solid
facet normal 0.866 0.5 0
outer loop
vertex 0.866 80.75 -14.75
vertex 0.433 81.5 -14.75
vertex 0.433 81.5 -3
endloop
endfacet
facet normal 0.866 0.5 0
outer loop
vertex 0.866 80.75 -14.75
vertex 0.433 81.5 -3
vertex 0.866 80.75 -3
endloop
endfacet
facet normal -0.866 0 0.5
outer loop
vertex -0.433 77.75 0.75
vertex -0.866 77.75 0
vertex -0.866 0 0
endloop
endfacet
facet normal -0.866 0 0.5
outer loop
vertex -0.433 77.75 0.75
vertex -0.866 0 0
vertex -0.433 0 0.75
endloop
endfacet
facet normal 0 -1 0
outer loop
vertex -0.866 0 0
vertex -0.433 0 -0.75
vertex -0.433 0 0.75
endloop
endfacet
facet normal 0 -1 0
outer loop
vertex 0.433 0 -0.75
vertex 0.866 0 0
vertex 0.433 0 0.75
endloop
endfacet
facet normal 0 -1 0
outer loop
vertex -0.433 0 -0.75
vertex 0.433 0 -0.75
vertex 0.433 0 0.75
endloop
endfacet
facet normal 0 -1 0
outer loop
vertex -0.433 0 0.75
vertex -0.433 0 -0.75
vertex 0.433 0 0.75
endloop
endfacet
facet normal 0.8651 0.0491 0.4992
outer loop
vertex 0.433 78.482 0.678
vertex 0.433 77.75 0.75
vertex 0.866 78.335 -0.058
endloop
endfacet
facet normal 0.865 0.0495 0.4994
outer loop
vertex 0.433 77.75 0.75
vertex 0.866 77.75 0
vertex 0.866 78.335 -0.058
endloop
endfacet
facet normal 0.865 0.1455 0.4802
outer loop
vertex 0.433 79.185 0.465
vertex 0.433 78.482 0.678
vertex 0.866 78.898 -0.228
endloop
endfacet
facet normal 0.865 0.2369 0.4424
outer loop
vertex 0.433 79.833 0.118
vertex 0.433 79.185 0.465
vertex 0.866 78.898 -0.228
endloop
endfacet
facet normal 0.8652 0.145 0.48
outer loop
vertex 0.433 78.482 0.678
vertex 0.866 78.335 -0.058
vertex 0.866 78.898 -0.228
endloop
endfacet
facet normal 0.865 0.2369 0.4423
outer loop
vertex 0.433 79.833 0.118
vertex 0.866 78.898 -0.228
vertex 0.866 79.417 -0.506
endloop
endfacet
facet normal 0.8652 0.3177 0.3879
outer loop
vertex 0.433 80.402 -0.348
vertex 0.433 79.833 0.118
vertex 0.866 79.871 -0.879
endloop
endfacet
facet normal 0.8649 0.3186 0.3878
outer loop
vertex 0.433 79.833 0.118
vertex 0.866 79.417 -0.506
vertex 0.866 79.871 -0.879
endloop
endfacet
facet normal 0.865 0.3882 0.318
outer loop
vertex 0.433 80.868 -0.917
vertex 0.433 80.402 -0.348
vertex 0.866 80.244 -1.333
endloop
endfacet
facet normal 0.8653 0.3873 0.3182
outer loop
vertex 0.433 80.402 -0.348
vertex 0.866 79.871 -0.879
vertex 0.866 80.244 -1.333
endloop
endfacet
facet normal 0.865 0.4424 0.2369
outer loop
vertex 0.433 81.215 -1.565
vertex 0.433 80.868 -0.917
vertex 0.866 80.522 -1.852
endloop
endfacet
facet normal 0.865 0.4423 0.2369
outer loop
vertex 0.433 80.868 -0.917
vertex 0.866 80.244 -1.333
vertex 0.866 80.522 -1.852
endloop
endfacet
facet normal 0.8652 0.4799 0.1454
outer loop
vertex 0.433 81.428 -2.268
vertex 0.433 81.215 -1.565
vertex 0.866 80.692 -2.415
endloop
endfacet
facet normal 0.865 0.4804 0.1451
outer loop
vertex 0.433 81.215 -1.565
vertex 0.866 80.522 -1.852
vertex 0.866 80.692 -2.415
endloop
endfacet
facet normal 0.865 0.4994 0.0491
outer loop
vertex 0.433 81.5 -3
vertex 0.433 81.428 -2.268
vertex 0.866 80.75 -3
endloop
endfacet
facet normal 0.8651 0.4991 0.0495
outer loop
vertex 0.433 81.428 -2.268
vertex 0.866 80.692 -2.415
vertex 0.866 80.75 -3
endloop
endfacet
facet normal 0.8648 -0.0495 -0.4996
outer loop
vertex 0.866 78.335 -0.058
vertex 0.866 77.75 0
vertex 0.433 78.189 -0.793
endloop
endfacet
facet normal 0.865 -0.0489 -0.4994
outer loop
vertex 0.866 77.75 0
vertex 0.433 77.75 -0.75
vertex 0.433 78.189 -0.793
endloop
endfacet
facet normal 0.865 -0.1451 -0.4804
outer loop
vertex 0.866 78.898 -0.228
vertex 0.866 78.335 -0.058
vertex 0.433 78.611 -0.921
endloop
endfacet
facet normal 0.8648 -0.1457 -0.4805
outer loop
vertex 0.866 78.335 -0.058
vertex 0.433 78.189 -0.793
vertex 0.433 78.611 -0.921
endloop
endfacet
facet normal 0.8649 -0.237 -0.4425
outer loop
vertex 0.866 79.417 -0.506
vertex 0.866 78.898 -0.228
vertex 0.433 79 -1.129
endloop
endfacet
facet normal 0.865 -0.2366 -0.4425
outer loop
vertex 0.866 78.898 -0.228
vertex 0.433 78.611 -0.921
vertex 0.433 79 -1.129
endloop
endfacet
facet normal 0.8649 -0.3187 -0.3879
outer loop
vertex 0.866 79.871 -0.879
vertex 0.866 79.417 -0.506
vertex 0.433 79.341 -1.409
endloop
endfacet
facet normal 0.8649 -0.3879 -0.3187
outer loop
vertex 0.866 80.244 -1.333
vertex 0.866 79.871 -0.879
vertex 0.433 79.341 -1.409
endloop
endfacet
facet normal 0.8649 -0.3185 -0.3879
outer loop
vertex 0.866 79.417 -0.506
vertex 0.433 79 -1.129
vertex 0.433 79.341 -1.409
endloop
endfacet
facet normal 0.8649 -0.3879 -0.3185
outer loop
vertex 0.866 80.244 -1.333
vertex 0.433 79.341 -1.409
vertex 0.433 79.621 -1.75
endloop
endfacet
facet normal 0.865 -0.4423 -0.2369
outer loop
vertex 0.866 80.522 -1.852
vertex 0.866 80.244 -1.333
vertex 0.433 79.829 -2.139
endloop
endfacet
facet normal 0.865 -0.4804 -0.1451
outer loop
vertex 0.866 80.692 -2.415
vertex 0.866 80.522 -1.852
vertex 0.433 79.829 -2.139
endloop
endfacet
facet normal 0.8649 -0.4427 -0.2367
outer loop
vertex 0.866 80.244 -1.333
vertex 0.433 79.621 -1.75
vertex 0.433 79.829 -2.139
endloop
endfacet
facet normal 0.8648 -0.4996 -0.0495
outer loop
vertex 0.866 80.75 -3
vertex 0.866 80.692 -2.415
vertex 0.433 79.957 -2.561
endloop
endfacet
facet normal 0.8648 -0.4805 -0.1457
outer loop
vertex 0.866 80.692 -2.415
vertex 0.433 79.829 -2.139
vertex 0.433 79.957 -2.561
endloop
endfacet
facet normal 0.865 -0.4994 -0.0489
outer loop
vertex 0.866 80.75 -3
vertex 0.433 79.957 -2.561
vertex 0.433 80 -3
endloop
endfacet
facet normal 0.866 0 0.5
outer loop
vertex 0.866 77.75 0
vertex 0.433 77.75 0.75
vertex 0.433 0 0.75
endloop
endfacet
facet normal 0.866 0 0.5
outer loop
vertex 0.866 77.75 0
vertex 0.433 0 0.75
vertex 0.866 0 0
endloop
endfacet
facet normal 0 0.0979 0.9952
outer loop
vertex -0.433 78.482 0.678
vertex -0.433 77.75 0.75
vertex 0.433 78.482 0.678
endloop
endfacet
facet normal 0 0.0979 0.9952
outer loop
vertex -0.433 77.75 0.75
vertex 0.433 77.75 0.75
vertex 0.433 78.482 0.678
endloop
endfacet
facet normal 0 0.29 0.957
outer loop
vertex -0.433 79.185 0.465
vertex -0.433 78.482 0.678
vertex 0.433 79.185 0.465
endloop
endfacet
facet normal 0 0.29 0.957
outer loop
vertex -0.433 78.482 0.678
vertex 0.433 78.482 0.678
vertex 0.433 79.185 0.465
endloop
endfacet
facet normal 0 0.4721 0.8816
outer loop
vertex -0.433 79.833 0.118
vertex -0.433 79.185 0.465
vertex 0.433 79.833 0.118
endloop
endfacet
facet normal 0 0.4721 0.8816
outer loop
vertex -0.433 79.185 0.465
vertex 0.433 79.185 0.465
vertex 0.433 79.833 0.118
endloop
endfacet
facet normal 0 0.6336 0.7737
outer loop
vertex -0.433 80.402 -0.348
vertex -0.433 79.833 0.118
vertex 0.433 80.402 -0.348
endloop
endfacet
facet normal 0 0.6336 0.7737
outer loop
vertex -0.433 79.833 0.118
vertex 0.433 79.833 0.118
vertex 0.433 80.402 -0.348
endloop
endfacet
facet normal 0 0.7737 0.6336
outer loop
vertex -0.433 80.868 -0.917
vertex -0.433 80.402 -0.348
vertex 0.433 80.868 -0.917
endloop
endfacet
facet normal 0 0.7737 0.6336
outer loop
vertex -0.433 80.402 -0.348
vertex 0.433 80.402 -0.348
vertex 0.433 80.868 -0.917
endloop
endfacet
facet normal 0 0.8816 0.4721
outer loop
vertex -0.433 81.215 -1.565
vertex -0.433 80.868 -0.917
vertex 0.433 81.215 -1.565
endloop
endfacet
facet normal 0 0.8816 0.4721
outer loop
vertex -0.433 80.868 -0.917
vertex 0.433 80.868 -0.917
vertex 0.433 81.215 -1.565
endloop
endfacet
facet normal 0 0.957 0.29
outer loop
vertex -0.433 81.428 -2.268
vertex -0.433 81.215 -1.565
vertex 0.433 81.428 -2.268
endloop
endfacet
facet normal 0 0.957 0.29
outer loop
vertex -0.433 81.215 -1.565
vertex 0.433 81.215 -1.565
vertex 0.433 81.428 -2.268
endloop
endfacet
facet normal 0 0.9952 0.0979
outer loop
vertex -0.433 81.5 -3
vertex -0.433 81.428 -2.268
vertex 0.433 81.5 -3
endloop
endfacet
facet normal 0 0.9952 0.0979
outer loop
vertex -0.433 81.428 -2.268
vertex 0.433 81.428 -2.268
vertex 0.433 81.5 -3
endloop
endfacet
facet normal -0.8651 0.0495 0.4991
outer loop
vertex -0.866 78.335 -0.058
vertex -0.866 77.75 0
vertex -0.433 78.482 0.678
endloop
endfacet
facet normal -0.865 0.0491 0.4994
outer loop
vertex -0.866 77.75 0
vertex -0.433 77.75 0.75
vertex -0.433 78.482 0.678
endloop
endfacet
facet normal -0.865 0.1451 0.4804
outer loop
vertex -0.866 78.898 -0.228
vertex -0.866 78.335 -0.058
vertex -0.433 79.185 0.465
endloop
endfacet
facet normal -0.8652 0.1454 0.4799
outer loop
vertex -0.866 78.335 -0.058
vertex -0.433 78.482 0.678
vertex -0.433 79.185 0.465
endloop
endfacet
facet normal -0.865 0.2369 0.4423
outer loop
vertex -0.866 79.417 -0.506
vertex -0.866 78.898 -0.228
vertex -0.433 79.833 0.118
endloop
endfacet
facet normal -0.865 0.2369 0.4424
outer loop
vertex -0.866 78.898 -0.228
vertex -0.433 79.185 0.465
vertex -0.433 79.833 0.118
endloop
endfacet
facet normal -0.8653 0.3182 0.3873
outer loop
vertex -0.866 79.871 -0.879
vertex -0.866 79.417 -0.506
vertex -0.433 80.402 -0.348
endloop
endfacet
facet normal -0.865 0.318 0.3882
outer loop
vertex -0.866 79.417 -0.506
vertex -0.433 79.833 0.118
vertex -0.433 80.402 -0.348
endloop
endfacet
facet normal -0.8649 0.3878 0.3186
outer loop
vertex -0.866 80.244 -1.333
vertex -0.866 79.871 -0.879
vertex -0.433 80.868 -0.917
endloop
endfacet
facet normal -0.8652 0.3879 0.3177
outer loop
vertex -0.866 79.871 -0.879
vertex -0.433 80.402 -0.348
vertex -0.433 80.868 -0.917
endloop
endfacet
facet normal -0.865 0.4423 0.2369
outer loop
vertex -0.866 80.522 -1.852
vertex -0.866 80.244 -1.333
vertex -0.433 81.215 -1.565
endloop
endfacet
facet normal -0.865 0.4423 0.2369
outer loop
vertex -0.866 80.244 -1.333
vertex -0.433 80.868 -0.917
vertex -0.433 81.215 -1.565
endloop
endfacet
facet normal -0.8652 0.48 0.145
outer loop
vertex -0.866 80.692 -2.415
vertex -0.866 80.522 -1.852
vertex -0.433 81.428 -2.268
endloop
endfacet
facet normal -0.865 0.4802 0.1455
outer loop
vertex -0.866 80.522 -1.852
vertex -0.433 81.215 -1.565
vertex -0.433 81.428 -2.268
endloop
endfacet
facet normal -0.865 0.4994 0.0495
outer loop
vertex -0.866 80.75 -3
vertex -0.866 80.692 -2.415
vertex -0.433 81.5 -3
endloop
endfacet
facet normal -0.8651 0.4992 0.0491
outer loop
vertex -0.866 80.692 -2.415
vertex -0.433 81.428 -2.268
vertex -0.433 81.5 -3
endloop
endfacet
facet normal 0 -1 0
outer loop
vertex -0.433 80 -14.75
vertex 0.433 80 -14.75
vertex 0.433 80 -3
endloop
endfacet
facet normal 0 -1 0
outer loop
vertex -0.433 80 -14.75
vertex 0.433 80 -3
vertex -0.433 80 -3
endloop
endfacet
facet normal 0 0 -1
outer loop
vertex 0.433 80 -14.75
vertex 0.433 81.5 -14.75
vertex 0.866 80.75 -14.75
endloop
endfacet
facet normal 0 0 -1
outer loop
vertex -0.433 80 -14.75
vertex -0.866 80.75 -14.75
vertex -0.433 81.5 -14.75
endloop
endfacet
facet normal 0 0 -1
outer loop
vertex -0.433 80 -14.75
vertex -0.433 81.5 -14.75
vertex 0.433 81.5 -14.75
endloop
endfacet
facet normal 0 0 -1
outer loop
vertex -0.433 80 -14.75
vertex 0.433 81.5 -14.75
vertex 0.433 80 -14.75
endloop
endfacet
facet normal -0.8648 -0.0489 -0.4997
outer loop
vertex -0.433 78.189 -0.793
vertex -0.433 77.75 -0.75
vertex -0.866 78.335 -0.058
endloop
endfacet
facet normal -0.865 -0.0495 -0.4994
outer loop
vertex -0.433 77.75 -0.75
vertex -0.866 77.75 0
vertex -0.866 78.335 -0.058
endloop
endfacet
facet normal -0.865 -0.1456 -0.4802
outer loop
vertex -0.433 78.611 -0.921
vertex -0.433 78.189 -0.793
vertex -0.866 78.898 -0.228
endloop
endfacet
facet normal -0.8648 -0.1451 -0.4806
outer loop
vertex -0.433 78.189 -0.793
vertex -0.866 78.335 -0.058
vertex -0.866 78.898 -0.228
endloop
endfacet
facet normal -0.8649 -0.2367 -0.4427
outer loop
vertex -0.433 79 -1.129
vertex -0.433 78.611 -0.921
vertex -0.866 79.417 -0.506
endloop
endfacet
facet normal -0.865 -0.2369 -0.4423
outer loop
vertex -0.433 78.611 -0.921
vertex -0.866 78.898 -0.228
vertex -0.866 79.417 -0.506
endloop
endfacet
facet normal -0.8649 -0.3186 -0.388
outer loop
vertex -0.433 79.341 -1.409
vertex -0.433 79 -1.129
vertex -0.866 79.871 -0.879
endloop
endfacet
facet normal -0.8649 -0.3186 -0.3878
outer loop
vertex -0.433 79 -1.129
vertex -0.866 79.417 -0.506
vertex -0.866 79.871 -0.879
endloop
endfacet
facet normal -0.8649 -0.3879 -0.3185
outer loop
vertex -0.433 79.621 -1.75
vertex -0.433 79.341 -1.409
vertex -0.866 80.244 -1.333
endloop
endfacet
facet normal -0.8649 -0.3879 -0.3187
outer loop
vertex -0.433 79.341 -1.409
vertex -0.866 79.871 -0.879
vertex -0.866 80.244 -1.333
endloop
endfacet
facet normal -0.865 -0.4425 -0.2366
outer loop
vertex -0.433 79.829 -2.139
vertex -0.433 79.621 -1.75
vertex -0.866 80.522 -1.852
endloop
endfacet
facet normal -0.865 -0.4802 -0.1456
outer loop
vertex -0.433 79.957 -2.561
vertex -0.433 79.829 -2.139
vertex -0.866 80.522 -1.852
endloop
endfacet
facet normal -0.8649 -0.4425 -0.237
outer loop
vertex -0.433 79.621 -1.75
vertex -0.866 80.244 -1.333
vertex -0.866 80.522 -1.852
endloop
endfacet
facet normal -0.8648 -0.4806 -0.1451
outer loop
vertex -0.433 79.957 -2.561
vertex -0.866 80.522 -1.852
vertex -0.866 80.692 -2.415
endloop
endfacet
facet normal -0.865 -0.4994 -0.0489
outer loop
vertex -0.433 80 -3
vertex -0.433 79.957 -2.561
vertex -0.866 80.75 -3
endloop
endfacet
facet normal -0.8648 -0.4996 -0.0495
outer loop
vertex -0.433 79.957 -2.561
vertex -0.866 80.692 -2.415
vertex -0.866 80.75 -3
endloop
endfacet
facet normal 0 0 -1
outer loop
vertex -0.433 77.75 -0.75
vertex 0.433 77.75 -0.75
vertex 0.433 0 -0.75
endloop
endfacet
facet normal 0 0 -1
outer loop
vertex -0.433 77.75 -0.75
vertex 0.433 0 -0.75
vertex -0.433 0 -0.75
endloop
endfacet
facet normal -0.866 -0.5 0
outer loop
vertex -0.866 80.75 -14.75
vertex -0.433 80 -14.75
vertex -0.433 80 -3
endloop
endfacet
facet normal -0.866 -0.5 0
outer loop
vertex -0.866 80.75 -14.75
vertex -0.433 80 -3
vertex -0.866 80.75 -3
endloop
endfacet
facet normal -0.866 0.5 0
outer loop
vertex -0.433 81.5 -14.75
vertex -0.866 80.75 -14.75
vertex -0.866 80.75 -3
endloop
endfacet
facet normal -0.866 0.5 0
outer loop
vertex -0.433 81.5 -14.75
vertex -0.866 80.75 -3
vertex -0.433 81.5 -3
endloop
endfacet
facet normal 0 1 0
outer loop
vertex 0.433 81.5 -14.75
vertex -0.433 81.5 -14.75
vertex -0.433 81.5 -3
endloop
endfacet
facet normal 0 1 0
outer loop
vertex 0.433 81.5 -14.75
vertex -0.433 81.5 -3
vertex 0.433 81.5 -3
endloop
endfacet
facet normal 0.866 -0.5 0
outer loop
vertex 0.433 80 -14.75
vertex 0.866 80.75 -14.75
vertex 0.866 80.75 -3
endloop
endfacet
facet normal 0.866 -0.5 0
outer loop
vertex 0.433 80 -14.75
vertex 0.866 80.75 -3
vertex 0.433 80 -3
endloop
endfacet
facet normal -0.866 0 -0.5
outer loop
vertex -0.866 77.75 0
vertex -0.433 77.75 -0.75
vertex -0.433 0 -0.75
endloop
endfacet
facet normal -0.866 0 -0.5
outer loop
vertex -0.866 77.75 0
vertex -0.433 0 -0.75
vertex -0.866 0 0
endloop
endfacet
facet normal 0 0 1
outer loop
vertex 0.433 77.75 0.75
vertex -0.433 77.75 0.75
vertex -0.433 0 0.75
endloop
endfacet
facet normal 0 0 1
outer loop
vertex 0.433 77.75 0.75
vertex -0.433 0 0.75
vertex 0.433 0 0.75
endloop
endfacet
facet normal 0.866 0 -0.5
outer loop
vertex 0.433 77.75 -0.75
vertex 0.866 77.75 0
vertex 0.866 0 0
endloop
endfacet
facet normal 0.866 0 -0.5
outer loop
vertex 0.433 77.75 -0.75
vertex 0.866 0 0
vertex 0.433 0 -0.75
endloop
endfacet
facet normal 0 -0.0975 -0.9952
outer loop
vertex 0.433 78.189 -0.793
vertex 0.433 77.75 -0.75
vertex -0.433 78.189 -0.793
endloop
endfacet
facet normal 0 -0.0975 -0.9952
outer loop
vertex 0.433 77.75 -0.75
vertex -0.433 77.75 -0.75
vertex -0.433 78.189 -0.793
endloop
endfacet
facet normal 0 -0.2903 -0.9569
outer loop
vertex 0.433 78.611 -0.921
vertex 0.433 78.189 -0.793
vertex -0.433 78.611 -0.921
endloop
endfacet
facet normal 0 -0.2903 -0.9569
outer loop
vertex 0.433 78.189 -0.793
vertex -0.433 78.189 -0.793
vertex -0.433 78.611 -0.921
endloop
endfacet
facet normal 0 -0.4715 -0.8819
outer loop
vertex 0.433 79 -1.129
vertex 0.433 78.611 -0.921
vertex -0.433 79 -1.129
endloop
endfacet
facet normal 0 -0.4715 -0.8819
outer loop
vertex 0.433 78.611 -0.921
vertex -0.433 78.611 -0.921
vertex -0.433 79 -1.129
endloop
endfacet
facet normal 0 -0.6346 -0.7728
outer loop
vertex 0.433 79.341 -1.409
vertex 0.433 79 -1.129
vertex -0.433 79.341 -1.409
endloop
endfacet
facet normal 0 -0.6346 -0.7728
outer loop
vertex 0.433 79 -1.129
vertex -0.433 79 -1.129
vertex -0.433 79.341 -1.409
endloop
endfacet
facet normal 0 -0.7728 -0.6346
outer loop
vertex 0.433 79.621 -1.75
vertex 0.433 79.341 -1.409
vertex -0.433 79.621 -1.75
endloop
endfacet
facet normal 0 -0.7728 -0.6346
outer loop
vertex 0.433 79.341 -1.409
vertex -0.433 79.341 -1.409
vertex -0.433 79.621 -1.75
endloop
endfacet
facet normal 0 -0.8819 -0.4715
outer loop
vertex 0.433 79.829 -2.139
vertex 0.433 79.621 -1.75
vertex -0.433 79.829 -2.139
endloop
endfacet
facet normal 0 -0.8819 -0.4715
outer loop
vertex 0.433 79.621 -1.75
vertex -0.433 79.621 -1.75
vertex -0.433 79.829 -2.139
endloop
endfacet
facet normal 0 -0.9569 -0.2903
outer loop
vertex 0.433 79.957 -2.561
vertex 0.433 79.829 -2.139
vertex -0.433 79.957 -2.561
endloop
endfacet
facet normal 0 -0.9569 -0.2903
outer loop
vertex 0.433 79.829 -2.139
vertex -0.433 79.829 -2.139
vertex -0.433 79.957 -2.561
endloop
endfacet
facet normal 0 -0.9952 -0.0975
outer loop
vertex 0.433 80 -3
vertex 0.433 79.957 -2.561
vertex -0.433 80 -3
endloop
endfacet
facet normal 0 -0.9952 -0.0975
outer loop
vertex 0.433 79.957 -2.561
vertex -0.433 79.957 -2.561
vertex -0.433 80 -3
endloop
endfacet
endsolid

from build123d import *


with BuildPart() as part:
    # Sweep1: sweep along a path in Sketch2
    with BuildLine(Plane(origin=(0, 0, 0), x_dir=(0, 0, -1), z_dir=(1, 0, 0))) as sweep1_path:
        Line((0, 0), (0, 77.75))
        ThreePointArc((0, 77.75), (0.878679656, 79.871320344), (3, 80.75))
        Line((3, 80.75), (14.75, 80.75))
    # Sketch1 → Sweep1 (sweep)
    with BuildSketch(Plane(origin=(0, 0, 0), x_dir=(1, 0, 0), z_dir=(0, 1, 0))):
        Polygon((0.866025404, 0), (0.433012702, 0.75), (-0.433012702, 0.75), (-0.866025404, 0), (-0.433012702, -0.75), (0.433012702, -0.75), align=None)
    sweep(path=sweep1_path.line)


solid = part.part
